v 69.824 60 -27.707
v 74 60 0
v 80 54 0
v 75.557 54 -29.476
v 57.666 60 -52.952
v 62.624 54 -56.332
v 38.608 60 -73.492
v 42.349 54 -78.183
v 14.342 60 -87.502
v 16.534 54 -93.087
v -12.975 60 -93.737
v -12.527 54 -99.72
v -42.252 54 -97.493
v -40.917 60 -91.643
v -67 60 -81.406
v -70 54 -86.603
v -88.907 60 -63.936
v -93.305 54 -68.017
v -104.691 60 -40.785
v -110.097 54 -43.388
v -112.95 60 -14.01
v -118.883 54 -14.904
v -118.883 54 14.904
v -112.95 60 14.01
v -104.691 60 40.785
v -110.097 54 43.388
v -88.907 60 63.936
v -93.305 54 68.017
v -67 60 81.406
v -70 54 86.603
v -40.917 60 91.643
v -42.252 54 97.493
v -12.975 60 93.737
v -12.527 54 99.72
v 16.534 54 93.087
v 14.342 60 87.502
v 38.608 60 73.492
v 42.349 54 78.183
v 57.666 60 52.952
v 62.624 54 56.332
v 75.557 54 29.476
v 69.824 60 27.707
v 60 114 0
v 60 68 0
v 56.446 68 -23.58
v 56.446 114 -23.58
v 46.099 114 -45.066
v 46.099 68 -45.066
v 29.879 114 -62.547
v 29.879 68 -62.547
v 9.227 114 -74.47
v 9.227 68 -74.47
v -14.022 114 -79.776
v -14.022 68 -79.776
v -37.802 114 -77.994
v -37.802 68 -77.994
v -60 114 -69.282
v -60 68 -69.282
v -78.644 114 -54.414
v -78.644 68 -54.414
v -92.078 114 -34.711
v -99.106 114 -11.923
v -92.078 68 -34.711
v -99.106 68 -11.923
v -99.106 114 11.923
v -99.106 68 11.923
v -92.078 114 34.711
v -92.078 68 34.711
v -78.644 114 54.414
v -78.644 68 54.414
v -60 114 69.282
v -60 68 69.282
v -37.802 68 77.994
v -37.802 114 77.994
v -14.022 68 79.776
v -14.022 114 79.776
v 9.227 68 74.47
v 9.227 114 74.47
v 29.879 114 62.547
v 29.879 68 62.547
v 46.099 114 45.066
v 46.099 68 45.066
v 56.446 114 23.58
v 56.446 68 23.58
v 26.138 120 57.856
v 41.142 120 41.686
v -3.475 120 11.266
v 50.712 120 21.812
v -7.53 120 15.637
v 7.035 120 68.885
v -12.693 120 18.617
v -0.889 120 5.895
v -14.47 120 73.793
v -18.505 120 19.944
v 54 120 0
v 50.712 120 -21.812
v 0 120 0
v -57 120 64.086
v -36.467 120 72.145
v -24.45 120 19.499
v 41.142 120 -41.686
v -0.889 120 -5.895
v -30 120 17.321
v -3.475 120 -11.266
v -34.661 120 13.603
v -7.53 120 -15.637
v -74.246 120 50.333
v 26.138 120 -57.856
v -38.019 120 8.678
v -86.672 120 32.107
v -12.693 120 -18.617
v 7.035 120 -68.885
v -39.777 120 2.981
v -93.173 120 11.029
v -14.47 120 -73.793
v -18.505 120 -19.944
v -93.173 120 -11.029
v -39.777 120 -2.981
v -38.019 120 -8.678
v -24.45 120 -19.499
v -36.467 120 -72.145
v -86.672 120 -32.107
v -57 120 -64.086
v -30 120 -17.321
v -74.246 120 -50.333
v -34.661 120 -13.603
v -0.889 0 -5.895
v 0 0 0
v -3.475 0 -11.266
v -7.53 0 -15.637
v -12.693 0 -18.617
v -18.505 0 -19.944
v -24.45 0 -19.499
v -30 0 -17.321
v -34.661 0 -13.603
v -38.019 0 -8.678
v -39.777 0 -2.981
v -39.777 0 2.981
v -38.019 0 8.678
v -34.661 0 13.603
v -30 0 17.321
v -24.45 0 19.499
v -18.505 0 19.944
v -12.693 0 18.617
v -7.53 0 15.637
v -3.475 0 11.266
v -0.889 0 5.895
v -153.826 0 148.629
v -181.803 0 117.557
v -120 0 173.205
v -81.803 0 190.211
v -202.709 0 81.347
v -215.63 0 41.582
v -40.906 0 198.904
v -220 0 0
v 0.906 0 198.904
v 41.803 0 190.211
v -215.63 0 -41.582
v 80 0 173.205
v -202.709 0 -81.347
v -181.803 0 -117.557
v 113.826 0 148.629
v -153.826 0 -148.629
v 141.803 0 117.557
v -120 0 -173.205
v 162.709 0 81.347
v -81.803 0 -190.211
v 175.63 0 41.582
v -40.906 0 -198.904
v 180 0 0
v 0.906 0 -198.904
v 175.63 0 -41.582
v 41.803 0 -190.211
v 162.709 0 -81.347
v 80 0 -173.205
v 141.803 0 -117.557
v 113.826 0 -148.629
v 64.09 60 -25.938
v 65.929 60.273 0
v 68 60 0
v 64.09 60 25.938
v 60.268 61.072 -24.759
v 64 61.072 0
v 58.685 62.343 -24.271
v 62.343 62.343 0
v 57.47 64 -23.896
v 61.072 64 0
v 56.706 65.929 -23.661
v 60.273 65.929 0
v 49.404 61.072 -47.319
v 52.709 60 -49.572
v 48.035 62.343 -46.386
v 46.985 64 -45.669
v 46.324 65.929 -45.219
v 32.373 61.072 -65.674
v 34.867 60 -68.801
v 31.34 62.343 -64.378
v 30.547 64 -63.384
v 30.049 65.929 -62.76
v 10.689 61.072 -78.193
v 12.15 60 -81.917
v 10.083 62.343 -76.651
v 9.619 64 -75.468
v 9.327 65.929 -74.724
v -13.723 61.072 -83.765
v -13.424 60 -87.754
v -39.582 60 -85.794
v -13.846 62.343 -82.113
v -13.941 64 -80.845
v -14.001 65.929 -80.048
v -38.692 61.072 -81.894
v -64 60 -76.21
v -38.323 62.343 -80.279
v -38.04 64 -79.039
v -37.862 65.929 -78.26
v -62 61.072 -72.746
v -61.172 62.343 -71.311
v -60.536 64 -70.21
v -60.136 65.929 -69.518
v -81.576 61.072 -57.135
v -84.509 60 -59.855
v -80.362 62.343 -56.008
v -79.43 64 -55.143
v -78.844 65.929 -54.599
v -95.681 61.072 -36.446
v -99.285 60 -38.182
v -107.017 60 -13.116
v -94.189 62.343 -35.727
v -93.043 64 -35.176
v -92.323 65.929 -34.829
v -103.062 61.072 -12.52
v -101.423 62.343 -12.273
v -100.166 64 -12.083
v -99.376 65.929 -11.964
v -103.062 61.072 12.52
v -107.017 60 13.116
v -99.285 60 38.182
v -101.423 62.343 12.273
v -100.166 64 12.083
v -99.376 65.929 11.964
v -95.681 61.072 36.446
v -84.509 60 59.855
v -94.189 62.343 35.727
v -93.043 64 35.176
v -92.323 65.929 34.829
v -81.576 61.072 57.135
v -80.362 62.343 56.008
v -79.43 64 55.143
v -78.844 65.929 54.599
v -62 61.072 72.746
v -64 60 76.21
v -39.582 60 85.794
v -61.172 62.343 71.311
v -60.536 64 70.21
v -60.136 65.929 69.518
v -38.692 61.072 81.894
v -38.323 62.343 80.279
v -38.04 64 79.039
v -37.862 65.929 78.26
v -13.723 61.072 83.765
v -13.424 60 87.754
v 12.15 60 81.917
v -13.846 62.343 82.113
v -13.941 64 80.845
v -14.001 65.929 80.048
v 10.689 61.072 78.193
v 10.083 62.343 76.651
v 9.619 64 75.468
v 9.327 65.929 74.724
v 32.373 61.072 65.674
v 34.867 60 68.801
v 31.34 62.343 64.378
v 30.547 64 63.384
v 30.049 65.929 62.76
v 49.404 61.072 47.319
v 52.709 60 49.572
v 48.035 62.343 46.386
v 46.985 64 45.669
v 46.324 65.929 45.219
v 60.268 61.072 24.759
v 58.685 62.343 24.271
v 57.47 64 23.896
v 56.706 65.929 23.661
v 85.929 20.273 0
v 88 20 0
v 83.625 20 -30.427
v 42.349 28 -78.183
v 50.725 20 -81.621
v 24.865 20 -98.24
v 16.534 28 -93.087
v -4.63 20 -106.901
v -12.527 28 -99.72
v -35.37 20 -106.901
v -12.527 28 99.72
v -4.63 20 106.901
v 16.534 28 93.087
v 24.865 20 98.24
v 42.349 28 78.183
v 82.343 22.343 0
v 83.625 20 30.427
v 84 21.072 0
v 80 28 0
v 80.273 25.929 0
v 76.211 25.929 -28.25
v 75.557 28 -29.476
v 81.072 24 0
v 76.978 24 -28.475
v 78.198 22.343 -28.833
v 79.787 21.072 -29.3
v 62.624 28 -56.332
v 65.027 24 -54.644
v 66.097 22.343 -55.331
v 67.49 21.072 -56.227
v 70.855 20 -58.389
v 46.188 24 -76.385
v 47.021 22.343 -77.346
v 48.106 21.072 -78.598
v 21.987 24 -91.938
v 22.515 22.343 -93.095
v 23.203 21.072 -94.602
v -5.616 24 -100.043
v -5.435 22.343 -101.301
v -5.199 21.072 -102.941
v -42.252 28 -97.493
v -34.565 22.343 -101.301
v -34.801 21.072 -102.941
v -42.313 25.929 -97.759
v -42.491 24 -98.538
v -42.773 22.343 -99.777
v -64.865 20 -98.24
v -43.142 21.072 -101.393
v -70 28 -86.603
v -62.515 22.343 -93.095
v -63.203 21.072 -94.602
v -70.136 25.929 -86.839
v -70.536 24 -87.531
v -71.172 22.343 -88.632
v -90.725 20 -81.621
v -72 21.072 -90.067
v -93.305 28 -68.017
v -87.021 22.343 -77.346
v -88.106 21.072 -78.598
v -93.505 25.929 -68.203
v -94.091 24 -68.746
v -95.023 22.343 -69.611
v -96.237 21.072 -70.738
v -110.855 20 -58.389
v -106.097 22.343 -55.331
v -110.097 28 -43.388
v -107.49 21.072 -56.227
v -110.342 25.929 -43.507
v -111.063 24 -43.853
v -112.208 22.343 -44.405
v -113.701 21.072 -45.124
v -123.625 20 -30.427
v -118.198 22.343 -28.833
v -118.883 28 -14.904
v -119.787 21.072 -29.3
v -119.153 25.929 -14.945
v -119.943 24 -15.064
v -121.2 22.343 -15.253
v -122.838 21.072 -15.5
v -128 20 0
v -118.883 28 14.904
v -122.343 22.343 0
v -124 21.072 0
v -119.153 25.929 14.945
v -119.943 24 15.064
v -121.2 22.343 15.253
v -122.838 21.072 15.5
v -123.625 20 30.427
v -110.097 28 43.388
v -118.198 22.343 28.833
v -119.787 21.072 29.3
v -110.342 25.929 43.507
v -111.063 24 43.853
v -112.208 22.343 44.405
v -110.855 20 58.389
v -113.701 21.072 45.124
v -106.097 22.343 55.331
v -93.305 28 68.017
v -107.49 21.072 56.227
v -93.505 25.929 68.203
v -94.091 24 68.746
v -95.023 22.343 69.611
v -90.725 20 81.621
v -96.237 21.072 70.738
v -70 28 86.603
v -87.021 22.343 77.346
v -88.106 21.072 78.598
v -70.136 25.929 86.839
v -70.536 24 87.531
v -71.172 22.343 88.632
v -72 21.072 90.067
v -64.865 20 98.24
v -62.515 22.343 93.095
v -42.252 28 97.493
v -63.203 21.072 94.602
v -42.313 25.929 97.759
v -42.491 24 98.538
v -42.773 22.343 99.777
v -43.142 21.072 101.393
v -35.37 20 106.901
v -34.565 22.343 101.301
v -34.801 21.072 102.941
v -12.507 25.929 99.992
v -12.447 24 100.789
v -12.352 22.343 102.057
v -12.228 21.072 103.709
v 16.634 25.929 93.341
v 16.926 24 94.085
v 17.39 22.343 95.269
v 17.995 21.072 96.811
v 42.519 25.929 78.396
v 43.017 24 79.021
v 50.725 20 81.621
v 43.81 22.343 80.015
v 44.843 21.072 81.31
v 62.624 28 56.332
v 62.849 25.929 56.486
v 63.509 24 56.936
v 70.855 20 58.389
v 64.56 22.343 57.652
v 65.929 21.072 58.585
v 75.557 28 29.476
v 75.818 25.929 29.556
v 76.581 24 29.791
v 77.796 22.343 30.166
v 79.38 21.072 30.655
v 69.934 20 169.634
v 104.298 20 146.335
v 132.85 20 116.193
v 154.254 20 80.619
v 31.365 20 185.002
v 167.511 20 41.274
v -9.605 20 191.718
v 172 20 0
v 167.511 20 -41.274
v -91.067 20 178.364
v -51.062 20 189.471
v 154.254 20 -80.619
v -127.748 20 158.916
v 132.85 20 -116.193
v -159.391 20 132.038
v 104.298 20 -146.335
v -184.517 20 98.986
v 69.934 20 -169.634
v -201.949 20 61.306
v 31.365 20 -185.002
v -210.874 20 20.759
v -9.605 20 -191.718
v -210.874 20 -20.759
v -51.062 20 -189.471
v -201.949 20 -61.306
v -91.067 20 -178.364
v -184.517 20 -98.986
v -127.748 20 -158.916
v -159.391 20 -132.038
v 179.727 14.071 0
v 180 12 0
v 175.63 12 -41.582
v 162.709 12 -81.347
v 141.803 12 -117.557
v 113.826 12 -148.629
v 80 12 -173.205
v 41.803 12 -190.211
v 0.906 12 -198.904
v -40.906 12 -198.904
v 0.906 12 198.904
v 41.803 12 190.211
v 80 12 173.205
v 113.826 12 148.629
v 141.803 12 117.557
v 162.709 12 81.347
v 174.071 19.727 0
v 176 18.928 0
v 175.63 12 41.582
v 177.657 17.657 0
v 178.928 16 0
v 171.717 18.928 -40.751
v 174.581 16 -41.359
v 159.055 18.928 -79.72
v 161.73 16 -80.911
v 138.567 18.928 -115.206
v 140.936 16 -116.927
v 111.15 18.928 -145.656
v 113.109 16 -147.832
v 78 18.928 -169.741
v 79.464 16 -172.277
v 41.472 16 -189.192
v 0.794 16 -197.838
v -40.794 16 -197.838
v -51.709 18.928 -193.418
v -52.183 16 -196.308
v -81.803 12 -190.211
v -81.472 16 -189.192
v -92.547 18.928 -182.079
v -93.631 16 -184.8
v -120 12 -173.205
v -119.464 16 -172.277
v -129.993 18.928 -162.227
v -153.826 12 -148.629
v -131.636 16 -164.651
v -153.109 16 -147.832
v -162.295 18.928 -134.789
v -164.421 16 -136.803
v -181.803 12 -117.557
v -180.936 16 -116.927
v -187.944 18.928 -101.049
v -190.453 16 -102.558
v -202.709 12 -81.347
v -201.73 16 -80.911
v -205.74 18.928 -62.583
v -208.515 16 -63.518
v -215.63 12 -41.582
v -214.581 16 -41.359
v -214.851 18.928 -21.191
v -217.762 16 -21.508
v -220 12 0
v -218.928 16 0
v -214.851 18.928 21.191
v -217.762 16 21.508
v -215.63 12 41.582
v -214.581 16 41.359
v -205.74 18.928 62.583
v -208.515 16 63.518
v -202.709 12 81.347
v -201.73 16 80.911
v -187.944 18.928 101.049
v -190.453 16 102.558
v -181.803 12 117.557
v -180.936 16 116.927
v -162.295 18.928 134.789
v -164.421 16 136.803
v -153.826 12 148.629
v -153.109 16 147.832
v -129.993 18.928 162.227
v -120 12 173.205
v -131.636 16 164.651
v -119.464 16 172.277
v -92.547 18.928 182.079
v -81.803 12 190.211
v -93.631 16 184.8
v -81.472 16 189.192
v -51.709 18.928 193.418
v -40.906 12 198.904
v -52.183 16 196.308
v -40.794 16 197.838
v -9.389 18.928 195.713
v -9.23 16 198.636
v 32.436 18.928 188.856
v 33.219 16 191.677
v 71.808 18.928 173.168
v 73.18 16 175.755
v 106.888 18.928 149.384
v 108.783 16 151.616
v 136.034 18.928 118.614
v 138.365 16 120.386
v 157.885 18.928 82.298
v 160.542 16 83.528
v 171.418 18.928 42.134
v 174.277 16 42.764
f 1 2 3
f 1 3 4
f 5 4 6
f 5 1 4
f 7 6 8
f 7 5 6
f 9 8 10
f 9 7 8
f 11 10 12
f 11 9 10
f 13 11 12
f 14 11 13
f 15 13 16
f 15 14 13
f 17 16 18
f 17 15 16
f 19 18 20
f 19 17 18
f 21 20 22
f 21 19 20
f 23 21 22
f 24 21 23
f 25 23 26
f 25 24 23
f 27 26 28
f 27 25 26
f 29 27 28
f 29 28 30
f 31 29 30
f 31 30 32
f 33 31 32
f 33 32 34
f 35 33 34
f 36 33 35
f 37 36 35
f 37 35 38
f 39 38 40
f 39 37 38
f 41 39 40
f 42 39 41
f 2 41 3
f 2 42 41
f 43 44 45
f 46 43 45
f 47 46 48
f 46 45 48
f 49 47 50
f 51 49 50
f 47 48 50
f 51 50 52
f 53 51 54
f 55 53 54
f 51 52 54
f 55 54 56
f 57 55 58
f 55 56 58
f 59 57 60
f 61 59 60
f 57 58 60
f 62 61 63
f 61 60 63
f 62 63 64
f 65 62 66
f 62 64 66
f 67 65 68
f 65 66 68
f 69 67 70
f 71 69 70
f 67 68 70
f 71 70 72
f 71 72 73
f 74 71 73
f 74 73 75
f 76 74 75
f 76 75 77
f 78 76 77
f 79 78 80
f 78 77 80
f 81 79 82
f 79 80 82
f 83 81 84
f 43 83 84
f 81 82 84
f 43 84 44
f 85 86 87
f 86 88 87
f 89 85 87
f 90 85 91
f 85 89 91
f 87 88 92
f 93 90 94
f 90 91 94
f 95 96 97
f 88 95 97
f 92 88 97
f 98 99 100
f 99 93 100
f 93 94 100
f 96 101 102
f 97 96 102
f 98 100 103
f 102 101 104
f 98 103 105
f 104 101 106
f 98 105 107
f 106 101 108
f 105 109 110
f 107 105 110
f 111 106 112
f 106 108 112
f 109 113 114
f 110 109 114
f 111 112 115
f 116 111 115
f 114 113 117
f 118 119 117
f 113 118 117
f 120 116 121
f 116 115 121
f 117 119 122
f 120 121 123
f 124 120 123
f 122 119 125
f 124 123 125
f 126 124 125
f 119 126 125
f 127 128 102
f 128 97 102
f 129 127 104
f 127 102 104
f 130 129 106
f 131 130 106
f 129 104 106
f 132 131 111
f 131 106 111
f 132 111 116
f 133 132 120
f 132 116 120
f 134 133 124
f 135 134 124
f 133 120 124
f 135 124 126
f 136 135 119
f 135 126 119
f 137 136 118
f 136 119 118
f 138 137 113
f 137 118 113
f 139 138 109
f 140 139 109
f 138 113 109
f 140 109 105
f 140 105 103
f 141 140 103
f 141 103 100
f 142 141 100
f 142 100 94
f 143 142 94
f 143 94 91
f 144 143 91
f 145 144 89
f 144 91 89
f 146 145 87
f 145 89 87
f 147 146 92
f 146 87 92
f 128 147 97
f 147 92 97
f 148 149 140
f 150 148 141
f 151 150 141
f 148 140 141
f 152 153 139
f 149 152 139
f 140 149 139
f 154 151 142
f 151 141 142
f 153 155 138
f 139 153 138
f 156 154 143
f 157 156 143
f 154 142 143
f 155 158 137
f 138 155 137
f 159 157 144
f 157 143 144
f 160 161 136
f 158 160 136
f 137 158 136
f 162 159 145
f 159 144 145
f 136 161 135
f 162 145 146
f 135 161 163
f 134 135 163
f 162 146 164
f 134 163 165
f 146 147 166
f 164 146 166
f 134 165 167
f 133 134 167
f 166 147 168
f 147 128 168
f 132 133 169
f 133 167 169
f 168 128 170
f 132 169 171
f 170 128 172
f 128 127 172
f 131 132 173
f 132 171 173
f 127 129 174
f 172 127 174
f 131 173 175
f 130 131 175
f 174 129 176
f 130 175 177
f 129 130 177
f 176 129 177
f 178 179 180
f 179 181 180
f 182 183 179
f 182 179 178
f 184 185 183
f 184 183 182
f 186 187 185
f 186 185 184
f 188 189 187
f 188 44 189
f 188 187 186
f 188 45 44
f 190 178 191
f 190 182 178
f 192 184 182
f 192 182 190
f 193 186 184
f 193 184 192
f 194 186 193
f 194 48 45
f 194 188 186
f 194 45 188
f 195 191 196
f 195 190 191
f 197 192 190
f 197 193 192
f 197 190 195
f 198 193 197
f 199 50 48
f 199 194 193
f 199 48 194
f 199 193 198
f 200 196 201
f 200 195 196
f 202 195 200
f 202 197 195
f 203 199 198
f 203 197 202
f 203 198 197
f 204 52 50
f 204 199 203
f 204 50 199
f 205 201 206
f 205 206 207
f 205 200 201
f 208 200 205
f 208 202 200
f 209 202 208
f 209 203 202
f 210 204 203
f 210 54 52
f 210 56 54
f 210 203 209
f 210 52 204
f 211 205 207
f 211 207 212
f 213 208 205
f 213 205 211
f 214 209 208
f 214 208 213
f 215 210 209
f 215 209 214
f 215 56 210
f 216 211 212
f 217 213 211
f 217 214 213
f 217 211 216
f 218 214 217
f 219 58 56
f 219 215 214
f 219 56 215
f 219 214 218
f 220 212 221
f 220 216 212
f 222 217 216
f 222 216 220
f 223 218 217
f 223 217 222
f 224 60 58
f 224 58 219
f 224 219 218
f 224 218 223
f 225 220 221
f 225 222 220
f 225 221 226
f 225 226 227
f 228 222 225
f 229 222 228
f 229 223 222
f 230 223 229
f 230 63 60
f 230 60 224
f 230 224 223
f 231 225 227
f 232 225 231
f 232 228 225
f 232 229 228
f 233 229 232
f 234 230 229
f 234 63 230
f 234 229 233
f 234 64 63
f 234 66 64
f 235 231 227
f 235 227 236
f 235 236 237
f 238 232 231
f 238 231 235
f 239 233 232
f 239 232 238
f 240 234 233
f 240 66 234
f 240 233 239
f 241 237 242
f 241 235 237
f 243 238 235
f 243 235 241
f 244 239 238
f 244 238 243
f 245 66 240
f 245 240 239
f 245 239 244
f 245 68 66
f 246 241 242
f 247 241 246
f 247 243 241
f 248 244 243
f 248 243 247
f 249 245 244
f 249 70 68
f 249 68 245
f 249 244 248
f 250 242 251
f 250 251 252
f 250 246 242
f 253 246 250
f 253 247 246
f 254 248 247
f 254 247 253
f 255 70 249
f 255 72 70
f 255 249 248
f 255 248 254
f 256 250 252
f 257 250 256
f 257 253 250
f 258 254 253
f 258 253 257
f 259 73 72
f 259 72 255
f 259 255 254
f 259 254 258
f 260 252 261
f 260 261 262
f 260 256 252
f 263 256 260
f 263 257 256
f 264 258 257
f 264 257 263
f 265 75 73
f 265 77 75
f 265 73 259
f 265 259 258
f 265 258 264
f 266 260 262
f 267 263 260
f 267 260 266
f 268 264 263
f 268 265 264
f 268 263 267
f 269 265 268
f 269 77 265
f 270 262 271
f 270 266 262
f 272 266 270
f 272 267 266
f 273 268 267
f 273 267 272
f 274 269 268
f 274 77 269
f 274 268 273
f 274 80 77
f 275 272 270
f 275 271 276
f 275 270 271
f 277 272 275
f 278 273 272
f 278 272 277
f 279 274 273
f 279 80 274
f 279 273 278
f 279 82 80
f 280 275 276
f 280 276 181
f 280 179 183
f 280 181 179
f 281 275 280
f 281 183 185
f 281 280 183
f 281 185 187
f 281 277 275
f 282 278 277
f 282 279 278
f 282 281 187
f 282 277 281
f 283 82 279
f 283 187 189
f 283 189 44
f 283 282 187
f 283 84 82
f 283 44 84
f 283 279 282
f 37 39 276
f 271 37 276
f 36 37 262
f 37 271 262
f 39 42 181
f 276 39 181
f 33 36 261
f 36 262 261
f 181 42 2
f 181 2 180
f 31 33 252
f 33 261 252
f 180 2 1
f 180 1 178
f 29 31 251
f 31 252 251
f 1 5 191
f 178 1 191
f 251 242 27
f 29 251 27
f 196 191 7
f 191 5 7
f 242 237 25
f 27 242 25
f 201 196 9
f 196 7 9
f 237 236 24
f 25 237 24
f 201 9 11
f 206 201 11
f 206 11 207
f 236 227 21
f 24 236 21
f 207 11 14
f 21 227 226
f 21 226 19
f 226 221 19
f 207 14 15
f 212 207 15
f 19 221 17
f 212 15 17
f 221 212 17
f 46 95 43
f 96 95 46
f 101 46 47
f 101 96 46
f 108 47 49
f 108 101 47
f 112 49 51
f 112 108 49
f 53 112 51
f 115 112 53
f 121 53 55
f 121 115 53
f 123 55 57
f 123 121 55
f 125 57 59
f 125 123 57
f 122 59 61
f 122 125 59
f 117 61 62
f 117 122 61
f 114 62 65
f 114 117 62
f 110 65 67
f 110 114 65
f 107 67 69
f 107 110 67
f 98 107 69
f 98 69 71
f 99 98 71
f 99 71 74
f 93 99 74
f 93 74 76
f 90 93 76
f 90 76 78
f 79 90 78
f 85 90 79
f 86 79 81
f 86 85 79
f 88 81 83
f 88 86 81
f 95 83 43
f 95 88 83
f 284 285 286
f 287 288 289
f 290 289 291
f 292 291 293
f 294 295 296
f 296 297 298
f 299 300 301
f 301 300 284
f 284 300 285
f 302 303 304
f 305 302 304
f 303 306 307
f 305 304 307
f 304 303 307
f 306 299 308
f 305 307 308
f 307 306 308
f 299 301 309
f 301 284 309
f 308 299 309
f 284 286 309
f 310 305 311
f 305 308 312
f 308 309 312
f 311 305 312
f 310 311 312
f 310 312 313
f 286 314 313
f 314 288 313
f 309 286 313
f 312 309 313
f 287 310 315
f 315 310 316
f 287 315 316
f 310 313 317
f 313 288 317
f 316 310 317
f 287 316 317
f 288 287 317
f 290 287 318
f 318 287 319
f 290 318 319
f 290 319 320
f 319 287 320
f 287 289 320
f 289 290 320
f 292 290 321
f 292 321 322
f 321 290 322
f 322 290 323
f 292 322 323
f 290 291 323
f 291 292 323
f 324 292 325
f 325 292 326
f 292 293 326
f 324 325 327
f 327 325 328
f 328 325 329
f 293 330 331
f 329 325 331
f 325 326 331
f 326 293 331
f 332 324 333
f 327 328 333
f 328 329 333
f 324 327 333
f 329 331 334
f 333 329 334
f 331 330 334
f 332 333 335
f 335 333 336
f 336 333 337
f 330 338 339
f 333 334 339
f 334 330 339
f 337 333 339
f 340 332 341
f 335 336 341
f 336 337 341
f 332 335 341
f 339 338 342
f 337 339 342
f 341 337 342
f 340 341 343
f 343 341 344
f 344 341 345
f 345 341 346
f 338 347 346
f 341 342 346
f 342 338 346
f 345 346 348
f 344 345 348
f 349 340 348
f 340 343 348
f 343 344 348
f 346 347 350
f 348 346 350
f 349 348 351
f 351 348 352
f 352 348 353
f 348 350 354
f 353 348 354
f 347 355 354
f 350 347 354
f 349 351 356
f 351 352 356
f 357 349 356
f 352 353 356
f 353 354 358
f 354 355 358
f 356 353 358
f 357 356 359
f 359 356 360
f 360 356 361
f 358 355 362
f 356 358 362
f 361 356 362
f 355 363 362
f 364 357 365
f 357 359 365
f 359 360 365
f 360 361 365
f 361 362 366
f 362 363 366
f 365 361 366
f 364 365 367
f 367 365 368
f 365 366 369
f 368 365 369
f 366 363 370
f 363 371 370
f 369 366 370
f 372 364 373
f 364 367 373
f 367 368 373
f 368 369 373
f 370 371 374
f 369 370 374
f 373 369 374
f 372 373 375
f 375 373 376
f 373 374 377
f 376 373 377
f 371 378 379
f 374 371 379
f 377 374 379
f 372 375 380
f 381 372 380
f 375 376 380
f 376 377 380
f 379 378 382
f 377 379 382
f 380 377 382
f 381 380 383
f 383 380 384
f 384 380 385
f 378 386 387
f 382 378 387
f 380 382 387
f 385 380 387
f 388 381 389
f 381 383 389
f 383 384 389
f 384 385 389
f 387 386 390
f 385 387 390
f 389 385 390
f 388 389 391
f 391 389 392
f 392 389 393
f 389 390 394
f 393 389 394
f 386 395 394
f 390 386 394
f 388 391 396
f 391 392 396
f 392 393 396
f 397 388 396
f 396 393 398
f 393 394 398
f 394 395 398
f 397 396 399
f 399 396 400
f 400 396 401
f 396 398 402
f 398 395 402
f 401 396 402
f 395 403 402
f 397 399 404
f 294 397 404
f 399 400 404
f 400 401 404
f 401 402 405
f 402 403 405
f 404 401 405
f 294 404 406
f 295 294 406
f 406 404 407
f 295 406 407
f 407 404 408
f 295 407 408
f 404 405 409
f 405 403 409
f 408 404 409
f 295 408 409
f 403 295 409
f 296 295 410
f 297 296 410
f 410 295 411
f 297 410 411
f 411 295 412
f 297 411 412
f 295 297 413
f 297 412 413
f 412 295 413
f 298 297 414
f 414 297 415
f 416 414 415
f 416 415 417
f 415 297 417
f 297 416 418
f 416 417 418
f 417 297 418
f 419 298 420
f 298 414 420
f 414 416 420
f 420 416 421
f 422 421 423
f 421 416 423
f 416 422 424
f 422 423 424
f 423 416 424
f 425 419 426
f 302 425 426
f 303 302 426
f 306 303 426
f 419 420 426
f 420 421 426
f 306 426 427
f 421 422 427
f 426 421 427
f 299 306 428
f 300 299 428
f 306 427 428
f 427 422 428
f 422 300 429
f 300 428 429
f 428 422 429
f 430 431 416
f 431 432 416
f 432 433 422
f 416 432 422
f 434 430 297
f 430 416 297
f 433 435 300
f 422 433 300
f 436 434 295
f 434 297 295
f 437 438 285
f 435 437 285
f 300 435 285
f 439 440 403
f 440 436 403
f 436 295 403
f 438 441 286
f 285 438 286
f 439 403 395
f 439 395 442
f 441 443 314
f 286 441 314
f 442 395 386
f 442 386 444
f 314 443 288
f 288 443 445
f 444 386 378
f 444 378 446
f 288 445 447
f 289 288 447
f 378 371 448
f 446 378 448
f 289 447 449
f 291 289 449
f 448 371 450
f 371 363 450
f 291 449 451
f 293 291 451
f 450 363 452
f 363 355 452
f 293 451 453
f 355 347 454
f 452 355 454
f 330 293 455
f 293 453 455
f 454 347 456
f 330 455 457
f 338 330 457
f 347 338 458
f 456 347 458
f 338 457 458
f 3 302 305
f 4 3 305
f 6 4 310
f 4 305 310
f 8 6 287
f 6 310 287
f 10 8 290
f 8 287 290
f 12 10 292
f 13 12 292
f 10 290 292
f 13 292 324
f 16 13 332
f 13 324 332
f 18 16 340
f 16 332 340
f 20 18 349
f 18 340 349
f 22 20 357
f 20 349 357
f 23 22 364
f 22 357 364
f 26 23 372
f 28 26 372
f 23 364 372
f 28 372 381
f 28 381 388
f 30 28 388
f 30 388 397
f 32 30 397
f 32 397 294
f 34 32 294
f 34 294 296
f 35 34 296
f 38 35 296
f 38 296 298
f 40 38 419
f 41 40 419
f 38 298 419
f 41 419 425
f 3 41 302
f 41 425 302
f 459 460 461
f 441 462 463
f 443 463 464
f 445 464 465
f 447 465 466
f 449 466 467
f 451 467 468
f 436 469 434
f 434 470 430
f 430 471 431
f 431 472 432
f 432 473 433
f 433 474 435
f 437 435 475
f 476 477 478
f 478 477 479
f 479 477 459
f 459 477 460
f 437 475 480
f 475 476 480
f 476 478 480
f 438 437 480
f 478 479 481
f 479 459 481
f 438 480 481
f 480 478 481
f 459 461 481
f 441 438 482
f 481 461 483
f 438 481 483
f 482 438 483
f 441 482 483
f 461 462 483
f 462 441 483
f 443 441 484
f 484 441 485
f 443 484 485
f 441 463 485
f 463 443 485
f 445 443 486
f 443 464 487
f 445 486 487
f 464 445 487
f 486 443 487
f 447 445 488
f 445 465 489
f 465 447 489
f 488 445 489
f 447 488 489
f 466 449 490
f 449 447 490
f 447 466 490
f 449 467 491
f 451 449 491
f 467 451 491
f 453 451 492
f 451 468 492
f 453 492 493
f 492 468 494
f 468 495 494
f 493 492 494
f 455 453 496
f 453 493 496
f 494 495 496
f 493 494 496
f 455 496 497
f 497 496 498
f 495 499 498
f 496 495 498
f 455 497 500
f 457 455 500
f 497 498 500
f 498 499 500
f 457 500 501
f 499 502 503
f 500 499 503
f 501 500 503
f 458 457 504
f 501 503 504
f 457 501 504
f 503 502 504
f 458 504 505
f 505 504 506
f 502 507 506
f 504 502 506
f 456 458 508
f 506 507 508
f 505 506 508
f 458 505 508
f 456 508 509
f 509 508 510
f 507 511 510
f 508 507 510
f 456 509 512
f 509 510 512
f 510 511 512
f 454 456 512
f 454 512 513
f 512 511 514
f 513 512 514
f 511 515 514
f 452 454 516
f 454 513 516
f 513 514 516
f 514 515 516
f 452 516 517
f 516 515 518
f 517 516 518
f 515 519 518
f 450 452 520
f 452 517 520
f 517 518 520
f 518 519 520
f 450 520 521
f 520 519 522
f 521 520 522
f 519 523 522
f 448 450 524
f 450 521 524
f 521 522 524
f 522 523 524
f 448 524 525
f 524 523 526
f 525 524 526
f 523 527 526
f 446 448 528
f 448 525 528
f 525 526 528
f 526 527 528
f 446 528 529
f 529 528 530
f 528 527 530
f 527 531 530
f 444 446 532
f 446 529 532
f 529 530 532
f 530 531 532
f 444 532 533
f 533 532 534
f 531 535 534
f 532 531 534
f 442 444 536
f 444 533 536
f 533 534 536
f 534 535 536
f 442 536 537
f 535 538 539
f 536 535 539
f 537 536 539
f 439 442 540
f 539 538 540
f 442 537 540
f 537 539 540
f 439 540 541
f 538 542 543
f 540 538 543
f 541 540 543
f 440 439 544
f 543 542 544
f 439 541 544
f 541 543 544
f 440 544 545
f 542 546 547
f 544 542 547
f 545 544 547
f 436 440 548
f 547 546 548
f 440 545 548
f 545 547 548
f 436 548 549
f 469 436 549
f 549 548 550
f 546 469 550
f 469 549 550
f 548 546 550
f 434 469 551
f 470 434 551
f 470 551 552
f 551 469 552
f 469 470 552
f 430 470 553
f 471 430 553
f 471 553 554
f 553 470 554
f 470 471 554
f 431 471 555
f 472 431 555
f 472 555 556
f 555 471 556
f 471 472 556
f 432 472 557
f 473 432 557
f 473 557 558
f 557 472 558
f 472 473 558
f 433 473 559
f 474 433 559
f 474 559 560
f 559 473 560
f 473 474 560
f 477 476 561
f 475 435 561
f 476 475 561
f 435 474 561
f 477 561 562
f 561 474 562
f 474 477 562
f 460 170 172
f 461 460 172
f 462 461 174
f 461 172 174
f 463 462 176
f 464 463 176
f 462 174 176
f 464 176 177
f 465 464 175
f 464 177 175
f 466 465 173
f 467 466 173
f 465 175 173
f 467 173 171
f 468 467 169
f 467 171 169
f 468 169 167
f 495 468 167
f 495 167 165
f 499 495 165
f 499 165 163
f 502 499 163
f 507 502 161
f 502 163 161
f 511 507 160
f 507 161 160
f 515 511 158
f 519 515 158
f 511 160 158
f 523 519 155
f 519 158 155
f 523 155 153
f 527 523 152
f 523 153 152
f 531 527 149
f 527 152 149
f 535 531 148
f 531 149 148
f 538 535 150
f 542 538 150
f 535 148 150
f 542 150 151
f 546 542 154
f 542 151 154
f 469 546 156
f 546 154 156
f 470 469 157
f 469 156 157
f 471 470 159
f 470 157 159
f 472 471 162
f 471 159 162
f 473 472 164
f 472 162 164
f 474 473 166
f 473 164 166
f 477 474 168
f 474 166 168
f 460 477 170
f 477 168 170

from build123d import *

# Parameters (mm, degrees)
FILLET4_R     = 8
CHAMFER5_SIZE = 6
FILLET5_R     = 8


with BuildPart() as part:
    # Sketch1 → Revolve5 (revolve)
    with BuildSketch(Plane.XY):
        Polygon((180, 0), (0, 0), (0, 120), (60, 120), (60, 60), (80, 60), (80, 20), (180, 20), align=None)
    revolve(axis=Axis((-20, 0, 0), (0, 1, 0)))

    # Fillet4
    fillet4_edges = [part.edges().sort_by_distance(p)[0] for p in [
        (-220, 20, 0),
    ]]
    fillet(fillet4_edges, radius=FILLET4_R)

    # Chamfer5
    chamfer5_edges = [part.edges().sort_by_distance(p)[0] for p in [
        (-120, 60, 0),
        (-100, 120, 0),
    ]]
    chamfer(chamfer5_edges, length=CHAMFER5_SIZE)

    # Fillet5
    fillet5_edges = [part.edges().sort_by_distance(p)[0] for p in [
        (-120, 20, 0),
        (-100, 60, 0),
    ]]
    fillet(fillet5_edges, radius=FILLET5_R)


solid = part.part
